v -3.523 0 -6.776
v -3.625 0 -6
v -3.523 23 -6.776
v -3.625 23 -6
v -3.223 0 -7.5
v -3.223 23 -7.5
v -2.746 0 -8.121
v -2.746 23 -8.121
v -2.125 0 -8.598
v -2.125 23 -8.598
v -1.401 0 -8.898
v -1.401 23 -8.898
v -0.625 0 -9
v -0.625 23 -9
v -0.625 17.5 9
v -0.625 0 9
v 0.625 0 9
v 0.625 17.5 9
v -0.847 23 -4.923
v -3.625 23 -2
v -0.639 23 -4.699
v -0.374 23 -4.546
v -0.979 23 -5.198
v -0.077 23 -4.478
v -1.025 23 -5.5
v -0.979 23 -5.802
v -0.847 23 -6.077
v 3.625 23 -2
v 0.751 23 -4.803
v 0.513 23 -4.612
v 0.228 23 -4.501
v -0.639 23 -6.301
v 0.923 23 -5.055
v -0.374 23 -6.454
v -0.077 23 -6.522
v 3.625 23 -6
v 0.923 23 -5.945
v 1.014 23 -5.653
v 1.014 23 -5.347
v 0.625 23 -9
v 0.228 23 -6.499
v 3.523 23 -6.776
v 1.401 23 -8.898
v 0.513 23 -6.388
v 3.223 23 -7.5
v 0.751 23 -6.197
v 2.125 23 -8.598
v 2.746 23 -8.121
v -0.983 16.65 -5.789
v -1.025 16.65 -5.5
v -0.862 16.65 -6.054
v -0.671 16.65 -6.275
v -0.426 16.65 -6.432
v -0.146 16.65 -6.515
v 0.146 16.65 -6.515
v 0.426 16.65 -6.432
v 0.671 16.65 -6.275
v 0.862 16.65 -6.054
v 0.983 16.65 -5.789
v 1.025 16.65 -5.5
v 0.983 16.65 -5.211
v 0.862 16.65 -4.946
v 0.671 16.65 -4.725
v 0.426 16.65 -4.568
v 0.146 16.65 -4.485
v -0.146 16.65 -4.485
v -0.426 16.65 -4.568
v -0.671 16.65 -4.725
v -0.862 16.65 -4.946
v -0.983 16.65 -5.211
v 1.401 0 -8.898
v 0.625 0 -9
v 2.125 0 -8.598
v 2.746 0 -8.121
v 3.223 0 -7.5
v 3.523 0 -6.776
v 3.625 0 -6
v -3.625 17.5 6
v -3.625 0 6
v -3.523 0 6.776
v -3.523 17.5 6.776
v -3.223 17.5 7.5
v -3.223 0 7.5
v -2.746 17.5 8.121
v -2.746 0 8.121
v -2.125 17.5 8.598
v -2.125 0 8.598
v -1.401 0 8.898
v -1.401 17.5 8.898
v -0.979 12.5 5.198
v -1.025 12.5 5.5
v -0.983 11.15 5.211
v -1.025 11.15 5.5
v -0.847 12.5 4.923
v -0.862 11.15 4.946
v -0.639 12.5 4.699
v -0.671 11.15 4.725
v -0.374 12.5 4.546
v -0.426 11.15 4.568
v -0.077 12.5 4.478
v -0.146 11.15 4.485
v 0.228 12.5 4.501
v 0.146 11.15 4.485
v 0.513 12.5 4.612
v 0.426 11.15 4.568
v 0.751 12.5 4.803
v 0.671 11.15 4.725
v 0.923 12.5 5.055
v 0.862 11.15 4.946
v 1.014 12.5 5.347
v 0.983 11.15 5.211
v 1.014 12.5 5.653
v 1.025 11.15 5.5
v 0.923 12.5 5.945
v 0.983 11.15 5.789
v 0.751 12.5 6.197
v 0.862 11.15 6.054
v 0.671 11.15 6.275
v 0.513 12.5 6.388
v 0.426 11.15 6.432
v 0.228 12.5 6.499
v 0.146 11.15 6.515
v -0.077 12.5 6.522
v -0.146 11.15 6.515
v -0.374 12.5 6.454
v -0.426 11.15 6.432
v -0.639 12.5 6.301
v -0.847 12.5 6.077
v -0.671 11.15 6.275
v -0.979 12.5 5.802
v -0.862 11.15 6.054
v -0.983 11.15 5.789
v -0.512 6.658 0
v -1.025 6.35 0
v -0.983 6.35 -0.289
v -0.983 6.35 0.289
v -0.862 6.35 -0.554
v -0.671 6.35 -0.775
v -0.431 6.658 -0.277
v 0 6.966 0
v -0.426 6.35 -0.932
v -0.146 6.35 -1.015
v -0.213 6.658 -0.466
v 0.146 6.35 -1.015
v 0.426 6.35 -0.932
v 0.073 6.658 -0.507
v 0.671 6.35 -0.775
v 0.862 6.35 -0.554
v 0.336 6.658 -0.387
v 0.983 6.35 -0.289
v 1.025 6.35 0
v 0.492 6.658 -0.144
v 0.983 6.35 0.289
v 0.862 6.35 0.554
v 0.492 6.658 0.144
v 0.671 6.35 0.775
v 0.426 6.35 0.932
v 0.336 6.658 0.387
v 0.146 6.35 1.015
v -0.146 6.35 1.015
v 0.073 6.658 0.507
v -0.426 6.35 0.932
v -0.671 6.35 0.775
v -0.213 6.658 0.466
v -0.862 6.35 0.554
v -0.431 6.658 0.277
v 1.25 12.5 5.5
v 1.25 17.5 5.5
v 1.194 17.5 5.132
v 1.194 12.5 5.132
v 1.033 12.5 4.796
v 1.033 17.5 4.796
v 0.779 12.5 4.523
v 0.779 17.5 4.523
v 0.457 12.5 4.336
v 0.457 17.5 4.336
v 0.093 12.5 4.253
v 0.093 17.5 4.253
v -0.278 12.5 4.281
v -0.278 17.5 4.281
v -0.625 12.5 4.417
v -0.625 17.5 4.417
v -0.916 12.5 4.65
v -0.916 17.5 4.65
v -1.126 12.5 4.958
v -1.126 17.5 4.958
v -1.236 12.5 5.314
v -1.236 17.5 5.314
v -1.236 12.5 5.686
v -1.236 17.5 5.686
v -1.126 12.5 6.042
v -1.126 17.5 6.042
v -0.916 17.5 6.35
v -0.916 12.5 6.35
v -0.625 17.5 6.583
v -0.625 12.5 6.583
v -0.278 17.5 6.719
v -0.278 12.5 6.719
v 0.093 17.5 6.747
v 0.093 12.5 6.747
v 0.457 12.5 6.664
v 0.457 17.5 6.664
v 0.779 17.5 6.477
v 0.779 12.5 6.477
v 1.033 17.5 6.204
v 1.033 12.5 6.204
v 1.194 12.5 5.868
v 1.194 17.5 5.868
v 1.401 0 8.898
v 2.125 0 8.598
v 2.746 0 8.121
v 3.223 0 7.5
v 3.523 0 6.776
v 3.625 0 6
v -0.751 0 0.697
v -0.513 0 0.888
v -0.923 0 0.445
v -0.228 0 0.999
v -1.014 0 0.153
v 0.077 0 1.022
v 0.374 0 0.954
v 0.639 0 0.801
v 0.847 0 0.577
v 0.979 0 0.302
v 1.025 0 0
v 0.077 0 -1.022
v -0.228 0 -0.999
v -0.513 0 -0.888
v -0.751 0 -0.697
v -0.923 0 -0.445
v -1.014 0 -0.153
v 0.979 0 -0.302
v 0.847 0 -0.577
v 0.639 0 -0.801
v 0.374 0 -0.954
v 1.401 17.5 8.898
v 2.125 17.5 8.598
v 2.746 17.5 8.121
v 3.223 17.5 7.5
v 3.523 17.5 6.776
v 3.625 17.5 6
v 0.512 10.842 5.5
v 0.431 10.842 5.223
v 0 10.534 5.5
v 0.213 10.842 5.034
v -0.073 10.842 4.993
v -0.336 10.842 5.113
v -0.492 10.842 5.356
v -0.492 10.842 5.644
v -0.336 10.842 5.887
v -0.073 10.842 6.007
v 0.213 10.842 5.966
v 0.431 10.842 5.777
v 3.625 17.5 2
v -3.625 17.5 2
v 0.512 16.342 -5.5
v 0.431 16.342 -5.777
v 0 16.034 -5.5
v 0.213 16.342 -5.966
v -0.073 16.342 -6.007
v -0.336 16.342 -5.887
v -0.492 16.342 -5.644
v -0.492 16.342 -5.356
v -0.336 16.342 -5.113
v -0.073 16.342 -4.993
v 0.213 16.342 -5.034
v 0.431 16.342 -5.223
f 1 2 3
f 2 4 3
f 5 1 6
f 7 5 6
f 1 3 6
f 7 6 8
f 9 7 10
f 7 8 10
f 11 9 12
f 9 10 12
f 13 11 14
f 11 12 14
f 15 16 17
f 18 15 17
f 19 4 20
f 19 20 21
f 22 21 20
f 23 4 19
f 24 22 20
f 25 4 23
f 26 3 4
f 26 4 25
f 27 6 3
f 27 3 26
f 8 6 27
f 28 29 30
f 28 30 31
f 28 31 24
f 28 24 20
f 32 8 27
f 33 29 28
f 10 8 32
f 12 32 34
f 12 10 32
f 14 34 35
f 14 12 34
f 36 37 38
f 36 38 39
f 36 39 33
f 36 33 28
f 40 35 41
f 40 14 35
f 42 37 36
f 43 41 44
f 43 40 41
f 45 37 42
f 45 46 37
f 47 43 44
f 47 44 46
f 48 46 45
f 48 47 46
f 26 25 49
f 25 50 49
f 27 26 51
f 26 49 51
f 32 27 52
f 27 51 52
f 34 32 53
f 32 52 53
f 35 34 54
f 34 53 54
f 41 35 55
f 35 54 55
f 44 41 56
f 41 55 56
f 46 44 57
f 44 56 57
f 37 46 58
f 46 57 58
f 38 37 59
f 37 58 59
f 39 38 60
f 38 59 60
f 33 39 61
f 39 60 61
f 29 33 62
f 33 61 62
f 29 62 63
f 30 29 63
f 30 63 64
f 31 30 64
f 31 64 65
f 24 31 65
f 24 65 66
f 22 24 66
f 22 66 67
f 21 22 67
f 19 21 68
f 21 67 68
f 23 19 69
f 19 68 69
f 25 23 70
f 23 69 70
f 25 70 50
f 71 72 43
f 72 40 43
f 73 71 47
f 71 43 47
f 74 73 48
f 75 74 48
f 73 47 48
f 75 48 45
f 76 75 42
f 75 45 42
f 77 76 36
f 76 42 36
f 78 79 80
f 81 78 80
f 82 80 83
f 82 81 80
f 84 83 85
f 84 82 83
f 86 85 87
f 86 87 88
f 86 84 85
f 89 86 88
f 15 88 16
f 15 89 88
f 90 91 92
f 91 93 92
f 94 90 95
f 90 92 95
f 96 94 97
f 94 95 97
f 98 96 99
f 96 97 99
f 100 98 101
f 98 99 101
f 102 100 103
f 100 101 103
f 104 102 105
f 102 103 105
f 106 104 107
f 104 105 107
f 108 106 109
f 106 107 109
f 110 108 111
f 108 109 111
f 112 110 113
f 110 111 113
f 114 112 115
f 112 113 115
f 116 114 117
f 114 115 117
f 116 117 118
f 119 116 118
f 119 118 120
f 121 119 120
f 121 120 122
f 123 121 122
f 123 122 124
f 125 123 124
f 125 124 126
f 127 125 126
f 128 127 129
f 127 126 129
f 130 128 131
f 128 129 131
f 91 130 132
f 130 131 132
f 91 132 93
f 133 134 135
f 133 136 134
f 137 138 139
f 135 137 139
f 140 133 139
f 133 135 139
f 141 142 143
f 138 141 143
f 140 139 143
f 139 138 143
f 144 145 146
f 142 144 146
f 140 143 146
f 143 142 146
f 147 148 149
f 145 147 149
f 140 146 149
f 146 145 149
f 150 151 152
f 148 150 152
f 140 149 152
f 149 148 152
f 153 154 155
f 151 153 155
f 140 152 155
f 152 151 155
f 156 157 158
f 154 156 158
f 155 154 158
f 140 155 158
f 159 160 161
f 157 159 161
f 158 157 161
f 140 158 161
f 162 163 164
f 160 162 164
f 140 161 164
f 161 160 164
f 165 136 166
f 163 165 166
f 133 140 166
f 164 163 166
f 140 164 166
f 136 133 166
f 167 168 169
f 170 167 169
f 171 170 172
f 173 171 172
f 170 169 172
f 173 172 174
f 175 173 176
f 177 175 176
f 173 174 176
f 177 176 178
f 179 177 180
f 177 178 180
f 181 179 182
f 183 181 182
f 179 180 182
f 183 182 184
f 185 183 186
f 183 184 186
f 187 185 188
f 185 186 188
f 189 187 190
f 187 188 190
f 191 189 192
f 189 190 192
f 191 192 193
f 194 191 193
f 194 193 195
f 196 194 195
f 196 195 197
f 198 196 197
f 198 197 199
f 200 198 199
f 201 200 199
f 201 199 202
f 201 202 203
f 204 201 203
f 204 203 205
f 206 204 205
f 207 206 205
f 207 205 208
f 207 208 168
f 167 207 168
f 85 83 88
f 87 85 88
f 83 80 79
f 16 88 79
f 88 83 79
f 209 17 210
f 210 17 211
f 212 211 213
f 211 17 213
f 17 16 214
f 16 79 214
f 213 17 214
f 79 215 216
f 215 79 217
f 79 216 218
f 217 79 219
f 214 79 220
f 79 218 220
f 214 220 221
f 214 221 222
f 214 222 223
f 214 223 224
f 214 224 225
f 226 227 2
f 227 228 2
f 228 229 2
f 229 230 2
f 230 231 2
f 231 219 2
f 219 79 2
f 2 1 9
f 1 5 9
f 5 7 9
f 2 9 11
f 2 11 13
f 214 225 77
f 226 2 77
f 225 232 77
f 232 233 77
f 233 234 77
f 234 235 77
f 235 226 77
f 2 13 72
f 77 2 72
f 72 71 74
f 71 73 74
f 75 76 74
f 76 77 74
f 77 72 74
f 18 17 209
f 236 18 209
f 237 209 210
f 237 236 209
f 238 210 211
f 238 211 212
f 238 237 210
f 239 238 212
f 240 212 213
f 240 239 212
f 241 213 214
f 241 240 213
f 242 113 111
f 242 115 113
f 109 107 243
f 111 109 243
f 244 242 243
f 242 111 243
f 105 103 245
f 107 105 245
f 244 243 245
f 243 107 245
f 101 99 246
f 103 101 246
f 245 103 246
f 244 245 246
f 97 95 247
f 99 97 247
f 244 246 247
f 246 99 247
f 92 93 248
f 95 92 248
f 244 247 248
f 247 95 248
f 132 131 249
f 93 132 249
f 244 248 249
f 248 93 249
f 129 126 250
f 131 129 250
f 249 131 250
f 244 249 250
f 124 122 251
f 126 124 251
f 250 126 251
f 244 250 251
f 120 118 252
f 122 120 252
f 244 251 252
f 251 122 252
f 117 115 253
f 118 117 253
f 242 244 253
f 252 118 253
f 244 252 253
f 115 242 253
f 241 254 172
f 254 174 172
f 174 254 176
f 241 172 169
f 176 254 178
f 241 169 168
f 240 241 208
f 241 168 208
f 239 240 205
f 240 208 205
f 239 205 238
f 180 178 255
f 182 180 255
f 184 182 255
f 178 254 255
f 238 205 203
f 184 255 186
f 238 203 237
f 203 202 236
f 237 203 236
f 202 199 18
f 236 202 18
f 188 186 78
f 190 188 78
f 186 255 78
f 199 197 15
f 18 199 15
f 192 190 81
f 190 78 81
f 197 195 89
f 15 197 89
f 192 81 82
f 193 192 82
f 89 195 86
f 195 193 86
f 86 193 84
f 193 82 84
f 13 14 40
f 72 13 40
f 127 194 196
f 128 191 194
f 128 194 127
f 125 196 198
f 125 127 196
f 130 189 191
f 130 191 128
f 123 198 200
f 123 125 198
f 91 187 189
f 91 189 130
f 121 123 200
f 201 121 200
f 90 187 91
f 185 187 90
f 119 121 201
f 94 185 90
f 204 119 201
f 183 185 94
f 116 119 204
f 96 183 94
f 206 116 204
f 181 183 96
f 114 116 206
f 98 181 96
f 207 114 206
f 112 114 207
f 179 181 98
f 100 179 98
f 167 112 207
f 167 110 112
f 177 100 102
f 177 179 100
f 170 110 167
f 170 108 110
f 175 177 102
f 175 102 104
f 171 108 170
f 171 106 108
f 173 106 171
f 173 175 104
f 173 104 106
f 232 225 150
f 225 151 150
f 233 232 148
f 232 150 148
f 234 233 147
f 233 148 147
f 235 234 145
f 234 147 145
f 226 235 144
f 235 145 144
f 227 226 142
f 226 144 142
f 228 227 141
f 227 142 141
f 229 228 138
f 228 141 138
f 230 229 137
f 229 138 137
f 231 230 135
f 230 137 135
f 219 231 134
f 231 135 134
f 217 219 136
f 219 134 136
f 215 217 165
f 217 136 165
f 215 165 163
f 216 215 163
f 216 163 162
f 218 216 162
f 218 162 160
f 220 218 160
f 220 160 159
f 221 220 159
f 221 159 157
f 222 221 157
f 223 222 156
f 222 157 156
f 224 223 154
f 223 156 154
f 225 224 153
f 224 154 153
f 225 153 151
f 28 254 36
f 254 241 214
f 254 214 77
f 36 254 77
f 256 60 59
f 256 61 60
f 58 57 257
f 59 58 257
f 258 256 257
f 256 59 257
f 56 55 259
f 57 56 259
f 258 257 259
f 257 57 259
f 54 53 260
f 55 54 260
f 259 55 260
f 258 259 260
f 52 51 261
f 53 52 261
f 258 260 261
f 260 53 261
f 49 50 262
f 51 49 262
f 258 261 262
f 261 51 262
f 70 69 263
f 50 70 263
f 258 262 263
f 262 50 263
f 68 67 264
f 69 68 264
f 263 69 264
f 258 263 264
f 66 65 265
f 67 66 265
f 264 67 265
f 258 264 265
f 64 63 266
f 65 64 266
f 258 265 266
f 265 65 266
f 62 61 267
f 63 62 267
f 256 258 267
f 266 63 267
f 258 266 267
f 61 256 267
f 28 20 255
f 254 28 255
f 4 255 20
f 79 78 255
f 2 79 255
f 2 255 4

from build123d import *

# Parameters (mm, degrees)
SKETCH1_W                          = 7.25
SKETCH1_H                          = 18
BOSS_EXTRUDE1_DEPTH                = 23
CUT_EXTRUDE1_DEPTH                 = 1
CUT_EXTRUDE1_DEPTH_BACK            = 8.25
M2_5X0_45_TAPPED_HOLE1_D           = 2.05
M2_5X0_45_TAPPED_HOLE1_DEPTH       = 6.35
M2_5X0_45_TAPPED_HOLE1_TIP         = 0.615882135
M2_5X0_45_TAPPED_HOLE2_D           = 2.05
M2_5X0_45_TAPPED_HOLE2_DEPTH       = 6.35
M2_5X0_45_TAPPED_HOLE2_TIP         = 0.615882135
M2_5X0_45_TAPPED_HOLE3_D           = 2.05
M2_5X0_45_TAPPED_HOLE3_DEPTH       = 6.35
M2_5X0_45_TAPPED_HOLE3_CBORE_D     = 2.5
M2_5X0_45_TAPPED_HOLE3_CBORE_DEPTH = 5
M2_5X0_45_TAPPED_HOLE3_TIP         = 0.615882135
FILLET1_R                          = 3


with BuildPart() as part:
    # Sketch1 → Boss-Extrude1 (new body)
    with BuildSketch(Plane(origin=(0, 0, 0), x_dir=(1, 0, 0), z_dir=(0, 1, 0))):
        Rectangle(SKETCH1_W, SKETCH1_H)
    extrude(amount=BOSS_EXTRUDE1_DEPTH)

    # Sketch2 → Cut-Extrude1 (cut, two sides)
    with BuildSketch(Plane.ZY.offset(3.625)) as cut_extrude1_sk:
        Polygon((-77.412327466, 23), (-9, 23), (-2, 23), (2, 17.5), (9, 17.5), (77.412327466, 17.5), (82.269830407, 154.238403027), (-72.554824525, 159.738403027), align=None)
    extrude(amount=CUT_EXTRUDE1_DEPTH, mode=Mode.SUBTRACT)
    extrude(cut_extrude1_sk.sketch, amount=-CUT_EXTRUDE1_DEPTH_BACK, mode=Mode.SUBTRACT)

    # M2.5x0.45 Tapped Hole1
    with Locations(Plane(origin=(0, 0, 0), x_dir=(-1, 0, 0), z_dir=(0, -1, 0))):
        with Locations((0, 0)):
            Hole(M2_5X0_45_TAPPED_HOLE1_D / 2, depth=M2_5X0_45_TAPPED_HOLE1_DEPTH)
            with Locations((0, 0, -(M2_5X0_45_TAPPED_HOLE1_DEPTH + M2_5X0_45_TAPPED_HOLE1_TIP / 2))):  # 118° drill point
                Cone(0, M2_5X0_45_TAPPED_HOLE1_D / 2, M2_5X0_45_TAPPED_HOLE1_TIP, mode=Mode.SUBTRACT)

    # M2.5x0.45 Tapped Hole2
    with Locations(Plane(origin=(0, 23, 0), x_dir=(1, 0, 0), z_dir=(0, 1, 0))):
        with Locations((0, 5.5)):
            Hole(M2_5X0_45_TAPPED_HOLE2_D / 2, depth=M2_5X0_45_TAPPED_HOLE2_DEPTH)
            with Locations((0, 0, -(M2_5X0_45_TAPPED_HOLE2_DEPTH + M2_5X0_45_TAPPED_HOLE2_TIP / 2))):  # 118° drill point
                Cone(0, M2_5X0_45_TAPPED_HOLE2_D / 2, M2_5X0_45_TAPPED_HOLE2_TIP, mode=Mode.SUBTRACT)

    # M2.5x0.45 Tapped Hole3
    with Locations(Plane(origin=(0, 17.5, 0), x_dir=(1, 0, 0), z_dir=(0, 1, 0))):
        with Locations((0, -5.5)):
            CounterBoreHole(M2_5X0_45_TAPPED_HOLE3_D / 2, M2_5X0_45_TAPPED_HOLE3_CBORE_D / 2, M2_5X0_45_TAPPED_HOLE3_CBORE_DEPTH, depth=M2_5X0_45_TAPPED_HOLE3_DEPTH)
            with Locations((0, 0, -(M2_5X0_45_TAPPED_HOLE3_DEPTH + M2_5X0_45_TAPPED_HOLE3_TIP / 2))):  # 118° drill point
                Cone(0, M2_5X0_45_TAPPED_HOLE3_D / 2, M2_5X0_45_TAPPED_HOLE3_TIP, mode=Mode.SUBTRACT)

    # Fillet1
    fillet1_edges = [part.edges().sort_by_distance(p)[0] for p in [
        (3.625, 8.75, 9),
        (-3.625, 8.75, 9),
        (-3.625, 11.5, -9),
        (3.625, 11.5, -9),
    ]]
    fillet(fillet1_edges, radius=FILLET1_R)


solid = part.part
